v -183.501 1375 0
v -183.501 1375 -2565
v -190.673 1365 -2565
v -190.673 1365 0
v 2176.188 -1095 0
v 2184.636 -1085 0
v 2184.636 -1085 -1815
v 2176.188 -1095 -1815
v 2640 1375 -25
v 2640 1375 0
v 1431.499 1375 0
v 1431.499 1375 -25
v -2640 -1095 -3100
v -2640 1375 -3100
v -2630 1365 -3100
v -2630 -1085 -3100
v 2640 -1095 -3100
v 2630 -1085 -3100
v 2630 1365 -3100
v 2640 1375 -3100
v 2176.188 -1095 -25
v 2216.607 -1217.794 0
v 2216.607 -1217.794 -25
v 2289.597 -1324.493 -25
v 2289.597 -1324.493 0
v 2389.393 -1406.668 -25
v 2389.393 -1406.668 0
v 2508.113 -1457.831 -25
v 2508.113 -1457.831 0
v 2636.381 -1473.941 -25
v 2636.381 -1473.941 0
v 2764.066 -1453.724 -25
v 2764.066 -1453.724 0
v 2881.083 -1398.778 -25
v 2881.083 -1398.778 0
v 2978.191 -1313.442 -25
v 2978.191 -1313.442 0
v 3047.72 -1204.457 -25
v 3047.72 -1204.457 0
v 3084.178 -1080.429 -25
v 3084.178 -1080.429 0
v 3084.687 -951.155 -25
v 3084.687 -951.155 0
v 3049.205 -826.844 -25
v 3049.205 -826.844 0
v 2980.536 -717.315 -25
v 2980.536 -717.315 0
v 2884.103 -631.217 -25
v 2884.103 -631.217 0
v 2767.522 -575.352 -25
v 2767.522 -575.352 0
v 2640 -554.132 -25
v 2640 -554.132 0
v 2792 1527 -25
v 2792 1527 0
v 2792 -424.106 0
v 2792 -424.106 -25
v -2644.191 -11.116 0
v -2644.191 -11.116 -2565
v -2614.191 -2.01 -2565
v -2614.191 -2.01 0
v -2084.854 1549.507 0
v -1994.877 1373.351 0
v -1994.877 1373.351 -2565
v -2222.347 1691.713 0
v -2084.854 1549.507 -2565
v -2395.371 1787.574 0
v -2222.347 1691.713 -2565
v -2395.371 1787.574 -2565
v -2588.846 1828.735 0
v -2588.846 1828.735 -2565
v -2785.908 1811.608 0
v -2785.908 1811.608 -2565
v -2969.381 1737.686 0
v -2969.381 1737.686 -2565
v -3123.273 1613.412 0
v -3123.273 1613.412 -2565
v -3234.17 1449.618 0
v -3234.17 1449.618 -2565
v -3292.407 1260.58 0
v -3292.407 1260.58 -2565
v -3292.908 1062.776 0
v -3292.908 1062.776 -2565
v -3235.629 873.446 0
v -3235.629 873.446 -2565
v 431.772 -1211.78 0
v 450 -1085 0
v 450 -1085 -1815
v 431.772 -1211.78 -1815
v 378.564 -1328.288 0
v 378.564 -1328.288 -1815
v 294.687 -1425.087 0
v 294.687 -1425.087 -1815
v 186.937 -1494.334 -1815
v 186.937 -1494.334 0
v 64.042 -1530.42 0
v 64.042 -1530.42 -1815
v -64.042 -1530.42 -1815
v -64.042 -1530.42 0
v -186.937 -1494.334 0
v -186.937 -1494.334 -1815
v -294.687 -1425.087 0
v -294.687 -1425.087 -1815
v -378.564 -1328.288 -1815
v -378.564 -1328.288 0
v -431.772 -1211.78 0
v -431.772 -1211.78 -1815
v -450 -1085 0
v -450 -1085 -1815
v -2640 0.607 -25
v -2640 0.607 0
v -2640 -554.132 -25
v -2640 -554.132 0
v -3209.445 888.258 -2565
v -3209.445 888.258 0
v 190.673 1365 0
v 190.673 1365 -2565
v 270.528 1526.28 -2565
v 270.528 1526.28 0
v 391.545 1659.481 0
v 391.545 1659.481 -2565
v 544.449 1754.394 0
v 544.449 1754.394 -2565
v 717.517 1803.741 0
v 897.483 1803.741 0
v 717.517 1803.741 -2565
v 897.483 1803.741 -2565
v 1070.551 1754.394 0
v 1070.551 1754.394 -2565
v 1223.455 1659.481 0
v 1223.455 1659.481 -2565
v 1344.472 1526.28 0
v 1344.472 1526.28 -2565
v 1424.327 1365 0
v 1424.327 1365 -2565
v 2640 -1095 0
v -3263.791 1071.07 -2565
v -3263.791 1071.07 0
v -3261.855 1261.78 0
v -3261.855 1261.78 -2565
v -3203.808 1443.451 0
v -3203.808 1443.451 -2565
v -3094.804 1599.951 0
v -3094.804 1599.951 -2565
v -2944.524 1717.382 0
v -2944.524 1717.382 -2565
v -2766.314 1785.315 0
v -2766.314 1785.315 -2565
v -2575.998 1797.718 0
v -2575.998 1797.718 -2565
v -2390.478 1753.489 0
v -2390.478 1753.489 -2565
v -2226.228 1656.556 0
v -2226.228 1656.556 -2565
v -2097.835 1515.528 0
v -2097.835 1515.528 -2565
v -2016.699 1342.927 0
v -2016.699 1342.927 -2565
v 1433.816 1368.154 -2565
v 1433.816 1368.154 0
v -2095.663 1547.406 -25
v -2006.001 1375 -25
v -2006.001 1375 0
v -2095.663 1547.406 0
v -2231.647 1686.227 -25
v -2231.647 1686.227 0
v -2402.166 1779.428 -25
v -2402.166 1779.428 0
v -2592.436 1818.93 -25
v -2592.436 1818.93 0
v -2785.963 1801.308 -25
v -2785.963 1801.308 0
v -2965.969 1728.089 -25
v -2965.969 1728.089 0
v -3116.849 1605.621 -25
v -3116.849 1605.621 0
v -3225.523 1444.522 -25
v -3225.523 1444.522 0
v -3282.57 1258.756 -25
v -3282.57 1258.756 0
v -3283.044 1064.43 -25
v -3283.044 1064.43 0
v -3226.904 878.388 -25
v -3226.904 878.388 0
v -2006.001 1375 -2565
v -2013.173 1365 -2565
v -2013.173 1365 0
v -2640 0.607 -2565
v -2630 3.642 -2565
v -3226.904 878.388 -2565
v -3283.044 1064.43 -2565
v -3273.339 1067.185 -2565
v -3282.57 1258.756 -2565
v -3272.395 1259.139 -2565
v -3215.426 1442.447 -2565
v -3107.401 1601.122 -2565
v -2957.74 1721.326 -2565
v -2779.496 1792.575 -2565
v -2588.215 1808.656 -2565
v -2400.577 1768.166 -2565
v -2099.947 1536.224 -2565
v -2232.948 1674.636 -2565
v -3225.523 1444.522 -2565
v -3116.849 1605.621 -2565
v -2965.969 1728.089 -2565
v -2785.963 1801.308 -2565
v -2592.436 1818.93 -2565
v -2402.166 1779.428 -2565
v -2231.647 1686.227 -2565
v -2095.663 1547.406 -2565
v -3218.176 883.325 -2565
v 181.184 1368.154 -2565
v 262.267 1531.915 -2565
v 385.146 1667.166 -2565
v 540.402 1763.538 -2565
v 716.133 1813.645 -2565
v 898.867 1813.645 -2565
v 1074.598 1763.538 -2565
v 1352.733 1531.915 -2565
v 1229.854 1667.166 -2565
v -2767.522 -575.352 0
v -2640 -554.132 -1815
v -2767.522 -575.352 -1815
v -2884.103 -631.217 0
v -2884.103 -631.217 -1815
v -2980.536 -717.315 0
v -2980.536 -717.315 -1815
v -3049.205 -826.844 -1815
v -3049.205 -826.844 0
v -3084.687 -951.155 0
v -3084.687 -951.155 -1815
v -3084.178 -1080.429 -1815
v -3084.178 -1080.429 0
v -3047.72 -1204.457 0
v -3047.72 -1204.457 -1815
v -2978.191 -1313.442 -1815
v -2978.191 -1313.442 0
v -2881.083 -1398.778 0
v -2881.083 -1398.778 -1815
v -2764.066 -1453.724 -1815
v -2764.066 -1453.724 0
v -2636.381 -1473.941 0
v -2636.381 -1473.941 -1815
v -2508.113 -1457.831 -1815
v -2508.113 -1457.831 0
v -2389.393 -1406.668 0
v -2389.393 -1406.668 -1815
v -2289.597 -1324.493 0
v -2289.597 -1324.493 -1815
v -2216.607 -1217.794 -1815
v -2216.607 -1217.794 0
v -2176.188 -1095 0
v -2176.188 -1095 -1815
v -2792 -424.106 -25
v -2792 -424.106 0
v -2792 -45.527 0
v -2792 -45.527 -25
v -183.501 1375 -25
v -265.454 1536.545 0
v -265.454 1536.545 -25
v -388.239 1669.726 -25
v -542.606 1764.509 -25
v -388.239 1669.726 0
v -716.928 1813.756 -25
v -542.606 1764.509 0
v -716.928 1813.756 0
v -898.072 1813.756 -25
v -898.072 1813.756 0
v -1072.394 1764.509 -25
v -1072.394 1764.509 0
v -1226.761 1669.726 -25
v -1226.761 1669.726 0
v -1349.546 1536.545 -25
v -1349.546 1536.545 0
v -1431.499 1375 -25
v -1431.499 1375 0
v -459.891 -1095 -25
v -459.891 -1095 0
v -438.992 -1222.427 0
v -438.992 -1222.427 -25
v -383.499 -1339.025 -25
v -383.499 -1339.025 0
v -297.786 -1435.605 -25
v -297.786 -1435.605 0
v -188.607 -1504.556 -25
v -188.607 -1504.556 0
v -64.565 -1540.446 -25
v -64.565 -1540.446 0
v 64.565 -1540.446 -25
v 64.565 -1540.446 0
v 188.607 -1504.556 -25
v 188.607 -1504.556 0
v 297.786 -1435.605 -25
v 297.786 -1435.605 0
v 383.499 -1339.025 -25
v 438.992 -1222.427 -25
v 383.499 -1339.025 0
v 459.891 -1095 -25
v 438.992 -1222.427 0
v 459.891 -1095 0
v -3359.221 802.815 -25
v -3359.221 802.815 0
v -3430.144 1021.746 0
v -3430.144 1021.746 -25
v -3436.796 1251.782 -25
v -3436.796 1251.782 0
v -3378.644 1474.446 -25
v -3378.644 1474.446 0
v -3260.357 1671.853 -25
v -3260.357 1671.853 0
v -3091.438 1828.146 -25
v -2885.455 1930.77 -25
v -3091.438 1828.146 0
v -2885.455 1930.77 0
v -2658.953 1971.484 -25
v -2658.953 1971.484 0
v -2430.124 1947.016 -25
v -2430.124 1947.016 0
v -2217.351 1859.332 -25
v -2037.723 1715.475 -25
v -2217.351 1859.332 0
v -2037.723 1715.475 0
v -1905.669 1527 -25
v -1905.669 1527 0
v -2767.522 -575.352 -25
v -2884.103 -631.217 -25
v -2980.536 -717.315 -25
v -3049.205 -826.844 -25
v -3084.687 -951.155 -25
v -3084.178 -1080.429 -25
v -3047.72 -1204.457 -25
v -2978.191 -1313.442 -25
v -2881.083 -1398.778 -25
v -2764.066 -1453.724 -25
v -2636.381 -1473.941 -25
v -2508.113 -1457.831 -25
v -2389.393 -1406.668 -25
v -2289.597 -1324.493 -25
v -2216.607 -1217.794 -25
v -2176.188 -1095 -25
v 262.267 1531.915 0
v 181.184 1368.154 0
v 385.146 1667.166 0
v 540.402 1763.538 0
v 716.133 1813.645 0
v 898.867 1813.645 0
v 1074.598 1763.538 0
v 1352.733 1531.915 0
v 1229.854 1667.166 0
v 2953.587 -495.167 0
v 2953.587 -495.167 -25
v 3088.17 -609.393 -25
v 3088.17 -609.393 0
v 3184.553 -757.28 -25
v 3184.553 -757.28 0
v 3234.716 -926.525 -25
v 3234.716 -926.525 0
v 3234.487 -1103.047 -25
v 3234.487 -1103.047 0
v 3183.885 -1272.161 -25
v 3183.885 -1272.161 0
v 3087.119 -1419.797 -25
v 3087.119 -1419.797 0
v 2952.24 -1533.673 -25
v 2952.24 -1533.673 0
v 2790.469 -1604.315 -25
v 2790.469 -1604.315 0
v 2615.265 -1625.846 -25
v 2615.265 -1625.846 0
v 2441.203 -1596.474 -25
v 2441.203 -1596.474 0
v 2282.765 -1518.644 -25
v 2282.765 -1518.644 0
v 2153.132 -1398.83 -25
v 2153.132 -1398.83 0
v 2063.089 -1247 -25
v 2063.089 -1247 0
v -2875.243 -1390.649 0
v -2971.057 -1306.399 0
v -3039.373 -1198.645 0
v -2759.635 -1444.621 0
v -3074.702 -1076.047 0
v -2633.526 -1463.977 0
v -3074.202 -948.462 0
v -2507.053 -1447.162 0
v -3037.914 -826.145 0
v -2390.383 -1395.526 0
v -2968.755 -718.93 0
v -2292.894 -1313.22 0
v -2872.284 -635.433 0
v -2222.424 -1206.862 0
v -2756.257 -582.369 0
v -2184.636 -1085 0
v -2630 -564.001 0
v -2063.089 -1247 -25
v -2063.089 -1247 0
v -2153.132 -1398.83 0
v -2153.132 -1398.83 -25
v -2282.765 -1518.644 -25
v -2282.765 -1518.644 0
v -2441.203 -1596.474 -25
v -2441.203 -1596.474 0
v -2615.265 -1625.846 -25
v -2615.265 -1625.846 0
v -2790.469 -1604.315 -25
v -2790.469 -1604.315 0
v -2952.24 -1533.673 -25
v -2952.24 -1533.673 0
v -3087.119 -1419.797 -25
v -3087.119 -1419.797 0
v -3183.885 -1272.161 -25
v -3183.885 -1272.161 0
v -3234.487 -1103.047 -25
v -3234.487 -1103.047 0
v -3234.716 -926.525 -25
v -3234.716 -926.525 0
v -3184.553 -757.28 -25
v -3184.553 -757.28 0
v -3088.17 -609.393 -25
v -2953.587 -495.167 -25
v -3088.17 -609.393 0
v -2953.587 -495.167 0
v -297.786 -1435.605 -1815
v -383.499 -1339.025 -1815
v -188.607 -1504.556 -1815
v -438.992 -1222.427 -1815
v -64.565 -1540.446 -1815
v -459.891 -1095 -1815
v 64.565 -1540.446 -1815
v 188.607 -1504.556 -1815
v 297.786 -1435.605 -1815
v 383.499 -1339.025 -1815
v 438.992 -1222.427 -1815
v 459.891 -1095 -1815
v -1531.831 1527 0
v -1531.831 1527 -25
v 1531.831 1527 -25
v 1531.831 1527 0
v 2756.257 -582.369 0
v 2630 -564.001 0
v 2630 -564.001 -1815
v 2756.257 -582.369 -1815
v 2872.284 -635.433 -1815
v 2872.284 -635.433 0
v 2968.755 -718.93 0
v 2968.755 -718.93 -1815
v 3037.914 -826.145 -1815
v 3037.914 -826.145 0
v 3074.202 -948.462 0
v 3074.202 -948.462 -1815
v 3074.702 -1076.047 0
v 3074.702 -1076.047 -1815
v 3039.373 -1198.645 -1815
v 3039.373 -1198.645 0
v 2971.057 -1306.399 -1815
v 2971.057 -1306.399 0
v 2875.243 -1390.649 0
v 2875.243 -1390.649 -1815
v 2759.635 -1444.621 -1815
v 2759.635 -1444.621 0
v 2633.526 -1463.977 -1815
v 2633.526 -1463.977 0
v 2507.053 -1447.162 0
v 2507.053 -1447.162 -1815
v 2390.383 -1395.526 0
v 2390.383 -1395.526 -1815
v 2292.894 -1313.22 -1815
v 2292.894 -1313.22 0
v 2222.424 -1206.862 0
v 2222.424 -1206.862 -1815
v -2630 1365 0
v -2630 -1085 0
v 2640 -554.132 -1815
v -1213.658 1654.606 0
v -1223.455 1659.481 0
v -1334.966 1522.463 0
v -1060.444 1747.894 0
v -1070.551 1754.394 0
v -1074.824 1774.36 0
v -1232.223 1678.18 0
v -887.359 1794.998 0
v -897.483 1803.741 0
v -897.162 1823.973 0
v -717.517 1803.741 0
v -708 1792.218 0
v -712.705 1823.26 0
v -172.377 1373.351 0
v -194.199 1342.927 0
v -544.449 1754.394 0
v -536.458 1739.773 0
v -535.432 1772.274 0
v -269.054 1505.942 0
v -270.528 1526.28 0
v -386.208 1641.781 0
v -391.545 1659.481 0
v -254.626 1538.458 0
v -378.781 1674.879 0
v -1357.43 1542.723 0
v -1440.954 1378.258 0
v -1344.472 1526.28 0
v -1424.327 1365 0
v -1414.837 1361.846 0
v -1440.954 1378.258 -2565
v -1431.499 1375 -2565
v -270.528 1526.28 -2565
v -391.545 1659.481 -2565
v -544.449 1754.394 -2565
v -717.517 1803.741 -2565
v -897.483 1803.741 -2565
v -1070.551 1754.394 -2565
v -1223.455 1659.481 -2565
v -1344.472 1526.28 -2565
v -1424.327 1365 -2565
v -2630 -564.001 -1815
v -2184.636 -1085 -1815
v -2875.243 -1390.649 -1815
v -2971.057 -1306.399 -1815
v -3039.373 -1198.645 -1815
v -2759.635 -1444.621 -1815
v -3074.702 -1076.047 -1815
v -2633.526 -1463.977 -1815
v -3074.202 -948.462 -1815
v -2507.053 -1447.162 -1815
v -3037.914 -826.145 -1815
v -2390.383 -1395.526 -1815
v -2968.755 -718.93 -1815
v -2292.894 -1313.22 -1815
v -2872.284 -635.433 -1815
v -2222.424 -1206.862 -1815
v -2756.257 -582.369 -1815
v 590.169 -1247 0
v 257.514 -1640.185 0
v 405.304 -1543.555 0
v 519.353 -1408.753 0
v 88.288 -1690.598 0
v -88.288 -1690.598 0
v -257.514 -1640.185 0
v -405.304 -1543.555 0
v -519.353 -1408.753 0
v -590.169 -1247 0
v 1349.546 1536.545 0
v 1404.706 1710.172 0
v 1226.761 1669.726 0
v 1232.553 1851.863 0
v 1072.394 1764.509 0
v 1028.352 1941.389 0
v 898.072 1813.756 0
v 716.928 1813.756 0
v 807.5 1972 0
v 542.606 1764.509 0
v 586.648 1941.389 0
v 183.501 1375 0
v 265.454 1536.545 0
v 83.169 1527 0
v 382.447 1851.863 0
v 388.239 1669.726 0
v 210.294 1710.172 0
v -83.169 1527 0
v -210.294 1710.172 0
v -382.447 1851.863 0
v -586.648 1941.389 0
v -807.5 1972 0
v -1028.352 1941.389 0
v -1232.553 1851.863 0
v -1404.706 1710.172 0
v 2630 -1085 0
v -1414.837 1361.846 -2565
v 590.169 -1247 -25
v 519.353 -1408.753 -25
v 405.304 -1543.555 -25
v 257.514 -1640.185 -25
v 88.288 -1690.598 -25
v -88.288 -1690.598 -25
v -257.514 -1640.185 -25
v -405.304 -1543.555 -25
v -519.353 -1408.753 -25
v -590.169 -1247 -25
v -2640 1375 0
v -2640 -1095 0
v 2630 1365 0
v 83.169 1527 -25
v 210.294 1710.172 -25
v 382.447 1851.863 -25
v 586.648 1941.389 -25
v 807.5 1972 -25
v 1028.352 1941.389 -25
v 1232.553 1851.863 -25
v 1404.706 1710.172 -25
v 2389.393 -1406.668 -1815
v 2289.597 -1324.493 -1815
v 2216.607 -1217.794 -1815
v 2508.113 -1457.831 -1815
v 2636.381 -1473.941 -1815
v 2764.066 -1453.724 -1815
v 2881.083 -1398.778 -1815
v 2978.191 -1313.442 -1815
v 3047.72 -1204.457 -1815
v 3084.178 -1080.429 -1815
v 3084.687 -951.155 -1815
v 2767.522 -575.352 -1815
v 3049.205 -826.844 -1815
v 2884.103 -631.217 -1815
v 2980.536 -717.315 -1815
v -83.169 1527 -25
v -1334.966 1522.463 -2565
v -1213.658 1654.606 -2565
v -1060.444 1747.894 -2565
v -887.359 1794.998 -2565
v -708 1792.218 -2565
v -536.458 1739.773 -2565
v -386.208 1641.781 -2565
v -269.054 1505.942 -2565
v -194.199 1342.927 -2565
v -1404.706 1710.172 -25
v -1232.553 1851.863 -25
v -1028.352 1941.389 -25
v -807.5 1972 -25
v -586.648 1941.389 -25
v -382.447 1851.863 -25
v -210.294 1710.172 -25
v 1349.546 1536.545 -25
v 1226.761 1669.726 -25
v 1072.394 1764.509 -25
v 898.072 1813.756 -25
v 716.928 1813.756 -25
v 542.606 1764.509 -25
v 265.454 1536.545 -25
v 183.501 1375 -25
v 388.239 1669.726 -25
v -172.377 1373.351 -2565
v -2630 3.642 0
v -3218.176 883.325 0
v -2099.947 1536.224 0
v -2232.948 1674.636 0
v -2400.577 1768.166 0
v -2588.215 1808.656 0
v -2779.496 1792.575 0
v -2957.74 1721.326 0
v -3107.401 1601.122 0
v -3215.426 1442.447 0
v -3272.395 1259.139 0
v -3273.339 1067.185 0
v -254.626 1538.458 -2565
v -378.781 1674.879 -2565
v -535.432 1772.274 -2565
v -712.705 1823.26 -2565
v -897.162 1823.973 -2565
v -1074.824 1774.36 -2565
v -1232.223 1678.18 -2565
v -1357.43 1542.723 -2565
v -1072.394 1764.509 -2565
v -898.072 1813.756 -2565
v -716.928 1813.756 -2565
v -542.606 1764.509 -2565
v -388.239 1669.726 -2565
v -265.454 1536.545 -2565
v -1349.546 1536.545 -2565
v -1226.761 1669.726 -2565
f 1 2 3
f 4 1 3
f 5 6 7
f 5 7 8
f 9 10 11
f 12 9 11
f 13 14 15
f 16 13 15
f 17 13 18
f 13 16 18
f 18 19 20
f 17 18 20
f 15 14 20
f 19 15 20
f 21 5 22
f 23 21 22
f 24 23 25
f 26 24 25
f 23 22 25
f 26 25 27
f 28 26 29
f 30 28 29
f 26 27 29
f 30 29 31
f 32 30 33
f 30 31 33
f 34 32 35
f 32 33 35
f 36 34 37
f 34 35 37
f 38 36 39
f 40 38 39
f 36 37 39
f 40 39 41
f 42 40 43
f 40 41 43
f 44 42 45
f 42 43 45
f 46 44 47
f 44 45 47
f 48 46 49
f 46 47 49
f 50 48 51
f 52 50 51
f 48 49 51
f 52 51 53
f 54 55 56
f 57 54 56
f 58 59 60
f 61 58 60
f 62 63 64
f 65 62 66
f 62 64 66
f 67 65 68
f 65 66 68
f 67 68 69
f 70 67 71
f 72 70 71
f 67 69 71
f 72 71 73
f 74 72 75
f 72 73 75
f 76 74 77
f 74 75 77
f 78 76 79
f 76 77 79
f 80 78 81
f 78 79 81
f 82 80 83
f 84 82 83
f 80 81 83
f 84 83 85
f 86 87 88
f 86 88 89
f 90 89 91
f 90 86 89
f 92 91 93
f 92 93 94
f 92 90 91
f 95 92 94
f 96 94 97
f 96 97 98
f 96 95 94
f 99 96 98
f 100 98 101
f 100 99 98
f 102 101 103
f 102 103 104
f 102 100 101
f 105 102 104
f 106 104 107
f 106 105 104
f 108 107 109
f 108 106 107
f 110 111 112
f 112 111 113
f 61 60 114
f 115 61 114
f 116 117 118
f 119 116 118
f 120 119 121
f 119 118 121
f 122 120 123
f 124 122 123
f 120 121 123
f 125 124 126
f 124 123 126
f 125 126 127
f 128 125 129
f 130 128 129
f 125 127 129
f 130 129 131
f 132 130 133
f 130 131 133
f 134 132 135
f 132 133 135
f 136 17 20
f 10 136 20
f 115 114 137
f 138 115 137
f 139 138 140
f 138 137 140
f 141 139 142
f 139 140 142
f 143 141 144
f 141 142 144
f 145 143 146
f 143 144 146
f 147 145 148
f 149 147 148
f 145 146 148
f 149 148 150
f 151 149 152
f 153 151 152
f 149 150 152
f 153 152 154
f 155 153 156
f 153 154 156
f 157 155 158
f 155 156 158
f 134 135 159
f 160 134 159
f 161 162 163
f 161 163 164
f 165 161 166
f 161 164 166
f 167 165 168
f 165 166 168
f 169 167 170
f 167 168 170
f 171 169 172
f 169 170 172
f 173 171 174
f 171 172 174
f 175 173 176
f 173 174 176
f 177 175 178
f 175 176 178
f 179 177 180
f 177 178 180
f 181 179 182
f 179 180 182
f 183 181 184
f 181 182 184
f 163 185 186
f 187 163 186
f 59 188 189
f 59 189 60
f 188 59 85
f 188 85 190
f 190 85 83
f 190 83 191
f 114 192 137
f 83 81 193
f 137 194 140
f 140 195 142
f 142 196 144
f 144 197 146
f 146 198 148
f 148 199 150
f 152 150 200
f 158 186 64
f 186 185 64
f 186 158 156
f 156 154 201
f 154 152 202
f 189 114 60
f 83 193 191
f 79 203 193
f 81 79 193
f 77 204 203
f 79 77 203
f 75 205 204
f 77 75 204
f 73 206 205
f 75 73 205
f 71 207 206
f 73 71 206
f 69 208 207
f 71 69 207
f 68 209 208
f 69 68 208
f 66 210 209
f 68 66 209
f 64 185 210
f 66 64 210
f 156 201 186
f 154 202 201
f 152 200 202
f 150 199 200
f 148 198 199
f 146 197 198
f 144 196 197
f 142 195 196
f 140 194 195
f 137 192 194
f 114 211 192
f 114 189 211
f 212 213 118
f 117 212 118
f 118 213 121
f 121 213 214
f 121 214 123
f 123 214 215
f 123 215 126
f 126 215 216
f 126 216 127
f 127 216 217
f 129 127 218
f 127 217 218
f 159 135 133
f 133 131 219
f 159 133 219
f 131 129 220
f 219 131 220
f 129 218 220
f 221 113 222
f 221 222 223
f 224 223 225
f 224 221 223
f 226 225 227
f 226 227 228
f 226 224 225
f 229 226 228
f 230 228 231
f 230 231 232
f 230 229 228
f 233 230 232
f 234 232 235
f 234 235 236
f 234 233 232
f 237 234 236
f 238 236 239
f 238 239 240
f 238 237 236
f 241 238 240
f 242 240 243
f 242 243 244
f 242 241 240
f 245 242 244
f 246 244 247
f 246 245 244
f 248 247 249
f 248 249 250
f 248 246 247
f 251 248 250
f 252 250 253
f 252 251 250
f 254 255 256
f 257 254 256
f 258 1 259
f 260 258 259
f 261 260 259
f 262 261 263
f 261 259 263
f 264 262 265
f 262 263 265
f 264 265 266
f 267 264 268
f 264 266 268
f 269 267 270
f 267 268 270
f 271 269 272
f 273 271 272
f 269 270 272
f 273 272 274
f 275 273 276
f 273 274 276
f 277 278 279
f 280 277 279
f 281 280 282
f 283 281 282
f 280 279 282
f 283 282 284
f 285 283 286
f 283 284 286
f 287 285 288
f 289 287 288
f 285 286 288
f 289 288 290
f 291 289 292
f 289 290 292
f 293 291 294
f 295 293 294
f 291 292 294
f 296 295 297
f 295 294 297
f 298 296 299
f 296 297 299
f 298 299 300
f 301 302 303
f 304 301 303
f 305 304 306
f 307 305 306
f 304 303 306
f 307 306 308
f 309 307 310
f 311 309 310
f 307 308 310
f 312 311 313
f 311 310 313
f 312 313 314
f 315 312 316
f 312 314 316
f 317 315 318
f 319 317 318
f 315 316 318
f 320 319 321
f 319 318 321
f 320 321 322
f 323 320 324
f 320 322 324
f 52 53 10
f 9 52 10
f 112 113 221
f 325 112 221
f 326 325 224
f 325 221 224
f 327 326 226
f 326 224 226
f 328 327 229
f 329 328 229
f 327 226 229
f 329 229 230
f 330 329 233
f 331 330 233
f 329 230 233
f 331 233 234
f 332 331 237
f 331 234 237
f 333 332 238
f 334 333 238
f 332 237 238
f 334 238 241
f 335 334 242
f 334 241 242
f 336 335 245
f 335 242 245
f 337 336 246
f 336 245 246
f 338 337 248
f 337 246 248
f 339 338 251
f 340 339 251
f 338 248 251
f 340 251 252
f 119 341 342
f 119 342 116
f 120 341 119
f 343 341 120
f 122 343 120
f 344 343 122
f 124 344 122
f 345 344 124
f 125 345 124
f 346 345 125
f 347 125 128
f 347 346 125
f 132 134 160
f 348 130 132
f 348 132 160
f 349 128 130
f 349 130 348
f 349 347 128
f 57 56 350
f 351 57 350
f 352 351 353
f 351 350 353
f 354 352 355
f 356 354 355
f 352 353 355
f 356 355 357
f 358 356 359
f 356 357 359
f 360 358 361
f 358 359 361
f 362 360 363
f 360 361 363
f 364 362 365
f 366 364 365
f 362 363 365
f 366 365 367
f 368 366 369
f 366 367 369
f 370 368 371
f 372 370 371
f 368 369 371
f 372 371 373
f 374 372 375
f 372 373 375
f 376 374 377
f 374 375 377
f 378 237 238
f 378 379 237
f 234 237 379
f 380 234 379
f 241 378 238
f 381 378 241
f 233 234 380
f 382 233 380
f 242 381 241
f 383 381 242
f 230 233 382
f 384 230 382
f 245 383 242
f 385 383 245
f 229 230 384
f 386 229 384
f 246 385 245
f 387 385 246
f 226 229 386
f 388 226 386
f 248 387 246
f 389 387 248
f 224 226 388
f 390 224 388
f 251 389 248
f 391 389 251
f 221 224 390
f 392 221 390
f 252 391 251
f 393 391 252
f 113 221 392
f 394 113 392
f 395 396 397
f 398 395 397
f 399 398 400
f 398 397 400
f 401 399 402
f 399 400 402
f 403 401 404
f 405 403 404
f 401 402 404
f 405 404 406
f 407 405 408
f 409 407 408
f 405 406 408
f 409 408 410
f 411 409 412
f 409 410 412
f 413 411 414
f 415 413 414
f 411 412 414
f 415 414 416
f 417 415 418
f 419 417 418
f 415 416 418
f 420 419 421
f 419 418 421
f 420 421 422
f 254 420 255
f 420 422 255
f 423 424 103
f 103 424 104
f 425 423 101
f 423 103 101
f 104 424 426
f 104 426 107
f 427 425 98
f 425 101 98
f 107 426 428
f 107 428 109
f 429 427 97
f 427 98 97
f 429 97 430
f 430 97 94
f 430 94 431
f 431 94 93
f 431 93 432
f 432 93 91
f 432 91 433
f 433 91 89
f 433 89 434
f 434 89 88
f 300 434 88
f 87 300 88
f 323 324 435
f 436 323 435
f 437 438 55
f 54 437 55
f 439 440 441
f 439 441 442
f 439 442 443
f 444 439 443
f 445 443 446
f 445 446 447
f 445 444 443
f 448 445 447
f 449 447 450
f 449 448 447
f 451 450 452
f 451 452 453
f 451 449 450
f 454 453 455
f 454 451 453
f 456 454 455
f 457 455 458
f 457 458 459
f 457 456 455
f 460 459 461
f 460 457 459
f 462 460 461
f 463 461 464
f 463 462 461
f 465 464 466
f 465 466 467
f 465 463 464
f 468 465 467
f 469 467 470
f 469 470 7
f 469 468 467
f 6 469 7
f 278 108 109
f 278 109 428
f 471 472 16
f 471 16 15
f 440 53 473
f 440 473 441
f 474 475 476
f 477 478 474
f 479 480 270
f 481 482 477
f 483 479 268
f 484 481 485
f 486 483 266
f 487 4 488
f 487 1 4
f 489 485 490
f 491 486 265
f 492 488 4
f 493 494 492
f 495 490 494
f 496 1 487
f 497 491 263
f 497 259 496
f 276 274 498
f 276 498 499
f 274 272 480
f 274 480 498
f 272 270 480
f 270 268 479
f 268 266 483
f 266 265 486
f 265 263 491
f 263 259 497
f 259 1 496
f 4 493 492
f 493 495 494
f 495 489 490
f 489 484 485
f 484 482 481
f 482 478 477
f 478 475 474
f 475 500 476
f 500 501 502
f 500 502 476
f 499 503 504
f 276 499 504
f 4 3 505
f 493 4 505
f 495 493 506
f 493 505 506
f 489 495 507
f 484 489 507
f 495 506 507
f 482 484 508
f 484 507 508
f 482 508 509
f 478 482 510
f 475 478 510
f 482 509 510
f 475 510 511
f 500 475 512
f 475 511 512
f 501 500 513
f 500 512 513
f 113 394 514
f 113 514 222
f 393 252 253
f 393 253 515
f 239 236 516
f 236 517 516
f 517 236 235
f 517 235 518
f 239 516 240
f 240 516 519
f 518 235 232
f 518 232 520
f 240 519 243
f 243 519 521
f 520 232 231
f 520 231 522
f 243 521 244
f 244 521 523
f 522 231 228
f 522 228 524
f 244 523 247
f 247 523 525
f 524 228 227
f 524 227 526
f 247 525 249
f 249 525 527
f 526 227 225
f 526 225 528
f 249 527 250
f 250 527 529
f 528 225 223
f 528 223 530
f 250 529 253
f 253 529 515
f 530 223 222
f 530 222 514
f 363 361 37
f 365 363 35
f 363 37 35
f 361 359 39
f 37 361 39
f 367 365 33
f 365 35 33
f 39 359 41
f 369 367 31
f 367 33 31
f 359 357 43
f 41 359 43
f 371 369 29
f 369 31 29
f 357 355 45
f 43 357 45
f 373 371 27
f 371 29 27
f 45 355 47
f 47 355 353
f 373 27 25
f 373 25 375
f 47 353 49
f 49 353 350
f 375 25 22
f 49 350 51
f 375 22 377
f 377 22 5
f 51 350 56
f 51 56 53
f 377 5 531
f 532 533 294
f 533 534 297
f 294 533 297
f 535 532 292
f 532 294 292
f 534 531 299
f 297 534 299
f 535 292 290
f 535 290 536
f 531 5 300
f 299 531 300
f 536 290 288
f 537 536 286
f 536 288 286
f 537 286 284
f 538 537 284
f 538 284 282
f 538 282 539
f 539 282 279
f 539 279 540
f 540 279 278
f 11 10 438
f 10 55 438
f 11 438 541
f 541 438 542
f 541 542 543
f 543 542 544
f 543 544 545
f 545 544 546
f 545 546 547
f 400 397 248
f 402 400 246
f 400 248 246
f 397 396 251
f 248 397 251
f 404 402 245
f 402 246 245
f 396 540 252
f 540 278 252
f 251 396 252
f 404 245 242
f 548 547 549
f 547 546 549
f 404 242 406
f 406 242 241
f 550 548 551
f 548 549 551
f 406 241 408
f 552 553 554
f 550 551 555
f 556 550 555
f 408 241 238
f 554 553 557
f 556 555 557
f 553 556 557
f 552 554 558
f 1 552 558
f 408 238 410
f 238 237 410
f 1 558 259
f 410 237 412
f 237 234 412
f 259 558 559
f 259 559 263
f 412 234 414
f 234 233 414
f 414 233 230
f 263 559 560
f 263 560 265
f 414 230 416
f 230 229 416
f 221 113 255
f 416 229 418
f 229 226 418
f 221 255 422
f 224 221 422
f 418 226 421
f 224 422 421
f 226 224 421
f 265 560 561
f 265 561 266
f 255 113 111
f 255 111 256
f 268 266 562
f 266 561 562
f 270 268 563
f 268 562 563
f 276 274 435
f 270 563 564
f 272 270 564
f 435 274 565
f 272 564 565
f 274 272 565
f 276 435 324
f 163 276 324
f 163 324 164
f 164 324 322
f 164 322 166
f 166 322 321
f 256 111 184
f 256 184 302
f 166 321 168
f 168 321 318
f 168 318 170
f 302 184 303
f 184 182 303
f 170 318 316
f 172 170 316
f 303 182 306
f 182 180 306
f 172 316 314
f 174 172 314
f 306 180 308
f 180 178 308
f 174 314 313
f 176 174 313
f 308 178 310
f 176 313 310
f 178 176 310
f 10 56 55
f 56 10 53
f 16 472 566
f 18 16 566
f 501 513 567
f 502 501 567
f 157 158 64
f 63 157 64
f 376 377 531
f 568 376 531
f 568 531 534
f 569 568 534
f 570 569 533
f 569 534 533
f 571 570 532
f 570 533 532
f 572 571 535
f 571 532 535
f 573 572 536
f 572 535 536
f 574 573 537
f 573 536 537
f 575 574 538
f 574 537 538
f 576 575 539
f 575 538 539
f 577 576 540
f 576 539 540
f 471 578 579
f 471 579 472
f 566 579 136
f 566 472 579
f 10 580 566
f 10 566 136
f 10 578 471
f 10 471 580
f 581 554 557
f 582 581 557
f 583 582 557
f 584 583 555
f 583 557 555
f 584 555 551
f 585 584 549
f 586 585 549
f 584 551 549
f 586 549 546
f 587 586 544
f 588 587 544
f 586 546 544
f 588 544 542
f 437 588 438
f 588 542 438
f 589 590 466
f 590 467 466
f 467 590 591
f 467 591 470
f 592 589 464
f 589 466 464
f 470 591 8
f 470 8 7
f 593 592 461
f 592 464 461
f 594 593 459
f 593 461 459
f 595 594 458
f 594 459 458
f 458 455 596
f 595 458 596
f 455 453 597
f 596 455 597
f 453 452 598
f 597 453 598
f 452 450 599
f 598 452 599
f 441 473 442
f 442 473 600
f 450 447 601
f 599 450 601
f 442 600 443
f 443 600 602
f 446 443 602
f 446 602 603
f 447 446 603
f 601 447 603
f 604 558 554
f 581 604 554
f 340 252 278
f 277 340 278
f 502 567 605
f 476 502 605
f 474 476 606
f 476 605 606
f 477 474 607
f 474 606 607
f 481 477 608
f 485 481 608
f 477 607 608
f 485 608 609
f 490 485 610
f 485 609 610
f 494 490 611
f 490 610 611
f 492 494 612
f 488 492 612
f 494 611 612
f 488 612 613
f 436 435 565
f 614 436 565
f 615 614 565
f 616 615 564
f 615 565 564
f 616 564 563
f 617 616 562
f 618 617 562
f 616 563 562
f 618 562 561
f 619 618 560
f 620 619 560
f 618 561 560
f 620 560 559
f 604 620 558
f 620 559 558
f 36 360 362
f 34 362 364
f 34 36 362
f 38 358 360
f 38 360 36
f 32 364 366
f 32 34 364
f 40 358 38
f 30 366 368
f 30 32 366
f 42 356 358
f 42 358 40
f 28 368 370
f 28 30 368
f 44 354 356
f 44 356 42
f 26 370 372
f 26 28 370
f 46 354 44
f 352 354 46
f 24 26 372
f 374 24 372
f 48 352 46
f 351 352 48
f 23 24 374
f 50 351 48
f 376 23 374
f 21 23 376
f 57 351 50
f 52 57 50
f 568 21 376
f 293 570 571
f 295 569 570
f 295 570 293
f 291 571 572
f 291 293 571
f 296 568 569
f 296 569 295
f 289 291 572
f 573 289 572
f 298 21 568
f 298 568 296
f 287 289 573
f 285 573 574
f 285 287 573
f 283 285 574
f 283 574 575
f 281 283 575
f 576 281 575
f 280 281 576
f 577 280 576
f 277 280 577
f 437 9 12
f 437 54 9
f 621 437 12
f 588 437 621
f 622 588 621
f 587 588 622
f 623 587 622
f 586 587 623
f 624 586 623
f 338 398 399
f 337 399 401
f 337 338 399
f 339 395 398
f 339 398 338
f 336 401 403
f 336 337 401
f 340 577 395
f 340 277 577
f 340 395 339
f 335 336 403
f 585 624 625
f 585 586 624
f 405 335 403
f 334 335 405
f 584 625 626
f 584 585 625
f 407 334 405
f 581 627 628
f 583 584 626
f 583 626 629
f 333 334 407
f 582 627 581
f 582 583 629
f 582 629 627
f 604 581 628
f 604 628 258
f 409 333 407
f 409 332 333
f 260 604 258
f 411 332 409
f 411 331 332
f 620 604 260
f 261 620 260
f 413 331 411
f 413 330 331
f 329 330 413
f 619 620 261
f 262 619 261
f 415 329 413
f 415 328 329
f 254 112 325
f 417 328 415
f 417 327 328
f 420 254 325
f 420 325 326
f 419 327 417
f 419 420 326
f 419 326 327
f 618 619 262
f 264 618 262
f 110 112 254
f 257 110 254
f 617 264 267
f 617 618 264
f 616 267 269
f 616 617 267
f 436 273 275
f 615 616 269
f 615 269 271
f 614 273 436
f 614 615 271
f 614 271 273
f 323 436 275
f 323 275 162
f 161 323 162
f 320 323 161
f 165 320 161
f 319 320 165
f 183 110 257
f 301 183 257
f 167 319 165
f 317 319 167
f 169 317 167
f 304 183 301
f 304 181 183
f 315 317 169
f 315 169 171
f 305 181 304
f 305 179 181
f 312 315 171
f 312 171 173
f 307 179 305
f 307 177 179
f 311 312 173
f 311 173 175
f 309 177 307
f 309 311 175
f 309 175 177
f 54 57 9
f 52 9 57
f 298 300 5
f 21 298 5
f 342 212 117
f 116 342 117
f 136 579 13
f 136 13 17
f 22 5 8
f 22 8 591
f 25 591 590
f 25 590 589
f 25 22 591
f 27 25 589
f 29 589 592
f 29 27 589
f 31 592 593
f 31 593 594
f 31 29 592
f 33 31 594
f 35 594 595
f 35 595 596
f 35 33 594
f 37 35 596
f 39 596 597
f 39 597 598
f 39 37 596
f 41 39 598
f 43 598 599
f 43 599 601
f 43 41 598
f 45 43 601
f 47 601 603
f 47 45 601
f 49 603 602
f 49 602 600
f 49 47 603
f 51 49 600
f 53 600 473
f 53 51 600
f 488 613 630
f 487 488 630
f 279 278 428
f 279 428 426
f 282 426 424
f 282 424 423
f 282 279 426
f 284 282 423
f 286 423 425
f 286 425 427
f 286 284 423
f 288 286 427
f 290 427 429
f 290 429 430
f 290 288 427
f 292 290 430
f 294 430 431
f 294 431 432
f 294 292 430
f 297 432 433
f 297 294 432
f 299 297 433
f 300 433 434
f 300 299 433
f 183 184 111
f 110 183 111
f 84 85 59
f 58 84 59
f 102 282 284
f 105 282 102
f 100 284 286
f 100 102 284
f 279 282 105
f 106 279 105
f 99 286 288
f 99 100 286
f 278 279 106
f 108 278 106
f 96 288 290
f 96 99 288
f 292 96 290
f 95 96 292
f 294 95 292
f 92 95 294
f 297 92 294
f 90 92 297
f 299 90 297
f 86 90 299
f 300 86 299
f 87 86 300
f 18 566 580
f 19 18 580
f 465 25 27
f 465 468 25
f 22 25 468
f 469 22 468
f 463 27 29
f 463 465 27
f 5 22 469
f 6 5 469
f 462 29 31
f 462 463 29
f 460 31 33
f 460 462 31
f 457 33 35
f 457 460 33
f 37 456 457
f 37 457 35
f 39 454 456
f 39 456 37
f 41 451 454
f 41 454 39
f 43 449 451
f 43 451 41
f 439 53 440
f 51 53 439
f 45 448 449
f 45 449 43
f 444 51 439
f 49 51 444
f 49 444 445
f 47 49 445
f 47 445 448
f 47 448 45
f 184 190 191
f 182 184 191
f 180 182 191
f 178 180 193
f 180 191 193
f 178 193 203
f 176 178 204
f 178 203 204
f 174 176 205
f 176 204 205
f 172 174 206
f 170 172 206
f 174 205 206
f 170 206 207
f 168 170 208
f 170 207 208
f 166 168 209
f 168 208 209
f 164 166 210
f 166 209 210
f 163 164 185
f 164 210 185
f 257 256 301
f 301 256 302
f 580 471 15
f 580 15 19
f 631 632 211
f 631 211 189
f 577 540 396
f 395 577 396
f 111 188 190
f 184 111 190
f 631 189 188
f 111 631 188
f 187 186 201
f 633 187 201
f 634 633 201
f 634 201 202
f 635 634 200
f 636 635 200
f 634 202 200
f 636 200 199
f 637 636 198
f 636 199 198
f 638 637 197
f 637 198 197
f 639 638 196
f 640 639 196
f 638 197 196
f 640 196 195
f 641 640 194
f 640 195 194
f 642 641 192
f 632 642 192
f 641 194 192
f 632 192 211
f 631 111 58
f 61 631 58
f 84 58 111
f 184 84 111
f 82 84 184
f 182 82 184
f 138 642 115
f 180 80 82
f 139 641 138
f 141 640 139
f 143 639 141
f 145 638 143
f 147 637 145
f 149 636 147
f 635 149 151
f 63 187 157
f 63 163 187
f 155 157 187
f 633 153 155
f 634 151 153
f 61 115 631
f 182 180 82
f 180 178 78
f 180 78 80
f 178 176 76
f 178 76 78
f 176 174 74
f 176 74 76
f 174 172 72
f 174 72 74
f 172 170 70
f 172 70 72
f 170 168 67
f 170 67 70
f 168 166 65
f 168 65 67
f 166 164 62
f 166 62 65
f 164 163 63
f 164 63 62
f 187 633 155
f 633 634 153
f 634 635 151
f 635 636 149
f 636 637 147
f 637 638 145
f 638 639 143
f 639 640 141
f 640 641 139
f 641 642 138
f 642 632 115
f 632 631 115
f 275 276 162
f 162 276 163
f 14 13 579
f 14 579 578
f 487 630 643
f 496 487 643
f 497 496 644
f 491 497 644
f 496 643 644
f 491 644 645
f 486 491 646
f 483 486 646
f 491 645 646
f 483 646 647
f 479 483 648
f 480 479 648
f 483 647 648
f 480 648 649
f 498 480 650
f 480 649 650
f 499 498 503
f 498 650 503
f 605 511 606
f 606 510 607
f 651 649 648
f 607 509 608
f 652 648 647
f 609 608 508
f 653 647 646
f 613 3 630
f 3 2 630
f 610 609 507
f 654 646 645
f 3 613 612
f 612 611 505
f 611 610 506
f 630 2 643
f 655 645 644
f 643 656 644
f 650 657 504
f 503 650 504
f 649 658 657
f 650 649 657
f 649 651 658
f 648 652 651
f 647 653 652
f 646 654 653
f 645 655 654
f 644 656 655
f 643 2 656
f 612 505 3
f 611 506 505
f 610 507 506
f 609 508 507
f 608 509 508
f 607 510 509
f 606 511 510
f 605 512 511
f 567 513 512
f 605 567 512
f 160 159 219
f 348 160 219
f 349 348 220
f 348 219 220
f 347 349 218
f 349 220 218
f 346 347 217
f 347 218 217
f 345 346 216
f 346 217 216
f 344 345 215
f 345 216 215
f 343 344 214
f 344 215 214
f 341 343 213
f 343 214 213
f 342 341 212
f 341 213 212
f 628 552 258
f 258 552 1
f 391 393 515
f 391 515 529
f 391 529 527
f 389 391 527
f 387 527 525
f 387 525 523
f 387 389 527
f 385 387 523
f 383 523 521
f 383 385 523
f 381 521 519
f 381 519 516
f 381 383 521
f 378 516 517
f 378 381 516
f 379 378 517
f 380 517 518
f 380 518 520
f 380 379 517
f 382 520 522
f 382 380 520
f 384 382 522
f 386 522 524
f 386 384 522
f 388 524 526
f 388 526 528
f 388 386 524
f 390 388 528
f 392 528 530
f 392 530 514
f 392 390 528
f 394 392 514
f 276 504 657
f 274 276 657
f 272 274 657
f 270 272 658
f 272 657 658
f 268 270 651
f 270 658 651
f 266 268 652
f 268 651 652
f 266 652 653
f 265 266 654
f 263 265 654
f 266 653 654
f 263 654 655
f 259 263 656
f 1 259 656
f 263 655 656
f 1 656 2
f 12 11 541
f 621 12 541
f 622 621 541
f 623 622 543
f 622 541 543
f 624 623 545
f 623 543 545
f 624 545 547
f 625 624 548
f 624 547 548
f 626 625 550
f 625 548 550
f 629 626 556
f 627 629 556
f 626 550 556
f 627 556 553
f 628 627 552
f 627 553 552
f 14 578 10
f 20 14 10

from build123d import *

# Parameters (mm, degrees)
BOSS_EXTRUDE2_DEPTH         = 25
SKETCH13_W                  = 5280
SKETCH13_H                  = 2470
SKETCH13_W_2                = 5260
SKETCH13_H_2                = 2450
EXTRUDE_THIN3_DEPTH         = 3100
OLTC_ROUND_EXTRUDE5_DEPTH   = 1815
OLTC_ROUND_EXTRUDE5_2_DEPTH = 1815
OLTC_ROUND_EXTRUDE5_3_DEPTH = 1815
EXTRUDE_THIN6_DEPTH         = 2565
EXTRUDE_THIN6_2_DEPTH       = 2565
EXTRUDE_THIN6_3_DEPTH       = 2565


with BuildPart() as part:
    # curb → Boss-Extrude2 (new body)
    with BuildSketch(Plane.XY):
        with BuildLine():
            ThreePointArc((-1905.669274433, 1527), (-2992.100860231, 1886.792244744), (-3359.22062819, 802.81478835))
            Line((-3359.22062819, 802.81478835), (-2792, -45.527139379))
            Line((-2792, -45.527139379), (-2792, -424.105941715))
            ThreePointArc((-2792, -424.105941715), (-3087.118903787, -1419.796833395), (-2063.089229648, -1247))
            Line((-2063.089229648, -1247), (-590.169467187, -1247))
            ThreePointArc((-590.169467187, -1247), (0, -1697), (590.169467187, -1247))
            Line((590.169467187, -1247), (2063.089229648, -1247))
            ThreePointArc((2063.089229648, -1247), (3087.118903787, -1419.796833395), (2792, -424.105941715))
            Line((2792, -424.105941715), (2792, 1527))
            Line((2792, 1527), (1531.830725567, 1527))
            ThreePointArc((1531.830725567, 1527), (807.5, 1972), (83.169274433, 1527))
            Line((83.169274433, 1527), (-83.169274433, 1527))
            ThreePointArc((-83.169274433, 1527), (-807.5, 1972), (-1531.830725567, 1527))
            Line((-1531.830725567, 1527), (-1905.669274433, 1527))
        make_face()
        with BuildLine():
            Line((-2640, -554.131540547), (-2640, 0.607028525))
            Line((-2640, 0.607028525), (-3226.904268523, 878.38804319))
            ThreePointArc((-3226.904268523, 878.38804319), (-2878.675275655, 1771.359638247), (-2006.000801283, 1375))
            Line((-2006.000801283, 1375), (-1431.499198717, 1375))
            ThreePointArc((-1431.499198717, 1375), (-807.5, 1820), (-183.500801283, 1375))
            Line((-183.500801283, 1375), (183.500801283, 1375))
            ThreePointArc((183.500801283, 1375), (807.5, 1820), (1431.499198717, 1375))
            Line((1431.499198717, 1375), (2640, 1375))
            Line((2640, 1375), (2640, -554.131540547))
            ThreePointArc((2640, -554.131540547), (2978.190785718, -1313.44247389), (2176.187676846, -1095))
            Line((2176.187676846, -1095), (459.891291503, -1095))
            ThreePointArc((459.891291503, -1095), (0, -1545), (-459.891291503, -1095))
            Line((-459.891291503, -1095), (-2176.187676846, -1095))
            ThreePointArc((-2176.187676846, -1095), (-2978.190785718, -1313.44247389), (-2640, -554.131540547))
        make_face(mode=Mode.SUBTRACT)
    extrude(amount=-BOSS_EXTRUDE2_DEPTH)


with BuildPart() as body_2:
    # Sketch13 → Extrude-Thin3 (new body)
    with BuildSketch(Plane.XY):
        with Locations((0, 140)):
            Rectangle(SKETCH13_W, SKETCH13_H)
        with Locations((0, 140)):
            Rectangle(SKETCH13_W_2, SKETCH13_H_2, mode=Mode.SUBTRACT)
    extrude(amount=-EXTRUDE_THIN3_DEPTH)


with BuildPart() as body_3:
    # hv round → oltc round-Extrude5 (new body)
    with BuildSketch(Plane.XY):
        with BuildLine():
            Line((2184.636410132, -1085), (2176.187676846, -1095))
            ThreePointArc((2176.187676846, -1095), (2978.190785718, -1313.44247389), (2640, -554.131540547))
            Line((2640, -554.131540547), (2630, -564.001111112))
            ThreePointArc((2630, -564.001111112), (2971.056689396, -1306.399078725), (2184.636410132, -1085))
        make_face()
    extrude(amount=-OLTC_ROUND_EXTRUDE5_DEPTH)


with BuildPart() as body_4:
    # hv round → oltc round-Extrude5 2 (new body)
    with BuildSketch(Plane.XY):
        with BuildLine():
            Line((459.891291503, -1095), (450, -1085))
            ThreePointArc((450, -1085), (0, -1535), (-450, -1085))
            Line((-450, -1085), (-459.891291503, -1095))
            ThreePointArc((-459.891291503, -1095), (0, -1545), (459.891291503, -1095))
        make_face()
    extrude(amount=-OLTC_ROUND_EXTRUDE5_2_DEPTH)


with BuildPart() as body_5:
    # hv round → oltc round-Extrude5 3 (new body)
    with BuildSketch(Plane.XY):
        with BuildLine():
            Line((-2176.187676846, -1095), (-2184.636410132, -1085))
            ThreePointArc((-2184.636410132, -1085), (-2971.056689396, -1306.399078725), (-2630, -564.001111112))
            Line((-2630, -564.001111112), (-2640, -554.131540547))
            ThreePointArc((-2640, -554.131540547), (-2978.190785718, -1313.44247389), (-2176.187676846, -1095))
        make_face()
    extrude(amount=-OLTC_ROUND_EXTRUDE5_3_DEPTH)


with BuildPart() as body_6:
    # oltc round → Extrude-Thin6 (new body)
    with BuildSketch(Plane.XY):
        with BuildLine():
            Line((-1994.876995624, 1373.351281489), (-2016.699304896, 1342.926918153))
            ThreePointArc((-2016.699304896, 1342.926918153), (-2857.963856524, 1758.023812334), (-3209.444791338, 888.257964622))
            Line((-3209.444791338, 888.257964622), (-2614.19136966, -2.010142948))
            Line((-2614.19136966, -2.010142948), (-2644.19136966, -11.115570824))
            Line((-2644.19136966, -11.115570824), (-3235.62924464, 873.445959658))
            ThreePointArc((-3235.62924464, 873.445959658), (-2880.387306316, 1781.4549033), (-1994.876995624, 1373.351281489))
        make_face()
        with BuildLine():
            Line((-2006.000801283, 1375), (-2013.173444151, 1365))
            ThreePointArc((-2013.173444151, 1365), (-2871.262954199, 1763.566224147), (-3218.17614189, 883.325414771))
            Line((-3218.17614189, 883.325414771), (-2630, 3.64217115))
            Line((-2630, 3.64217115), (-2640, 0.607028525))
            Line((-2640, 0.607028525), (-3226.904268523, 878.38804319))
            ThreePointArc((-3226.904268523, 878.38804319), (-2878.675275655, 1771.359638247), (-2006.000801283, 1375))
        make_face(mode=Mode.SUBTRACT)
    extrude(amount=-EXTRUDE_THIN6_DEPTH)


with BuildPart() as body_7:
    # oltc round → Extrude-Thin6 2 (new body)
    with BuildSketch(Plane.XY):
        with BuildLine():
            ThreePointArc((-1424.326555849, 1365), (-807.5, 1810), (-190.673444151, 1365))
            Line((-190.673444151, 1365), (-183.500801283, 1375))
            ThreePointArc((-183.500801283, 1375), (-807.5, 1820), (-1431.499198717, 1375))
            Line((-1431.499198717, 1375), (-1440.953732031, 1378.257575758))
            ThreePointArc((-1440.953732031, 1378.257575758), (-804.908755433, 1829.994989124), (-172.376995624, 1373.351281489))
            Line((-172.376995624, 1373.351281489), (-194.199304896, 1342.926918153))
            ThreePointArc((-194.199304896, 1342.926918153), (-797.581530686, 1799.923139108), (-1414.836916528, 1361.846153846))
            Line((-1414.836916528, 1361.846153846), (-1424.326555849, 1365))
        make_face()
    extrude(amount=-EXTRUDE_THIN6_2_DEPTH)


with BuildPart() as body_8:
    # oltc round → Extrude-Thin6 3 (new body)
    with BuildSketch(Plane.XY):
        with BuildLine():
            ThreePointArc((1424.326555849, 1365), (807.5, 1810), (190.673444151, 1365))
            Line((190.673444151, 1365), (181.183804831, 1368.153846154))
            ThreePointArc((181.183804831, 1368.153846154), (807.5, 1820), (1433.816195169, 1368.153846154))
            Line((1433.816195169, 1368.153846154), (1424.326555849, 1365))
        make_face()
    extrude(amount=-EXTRUDE_THIN6_3_DEPTH)


solid = Compound([part.part, body_2.part, body_3.part, body_4.part, body_5.part, body_6.part, body_7.part, body_8.part])
